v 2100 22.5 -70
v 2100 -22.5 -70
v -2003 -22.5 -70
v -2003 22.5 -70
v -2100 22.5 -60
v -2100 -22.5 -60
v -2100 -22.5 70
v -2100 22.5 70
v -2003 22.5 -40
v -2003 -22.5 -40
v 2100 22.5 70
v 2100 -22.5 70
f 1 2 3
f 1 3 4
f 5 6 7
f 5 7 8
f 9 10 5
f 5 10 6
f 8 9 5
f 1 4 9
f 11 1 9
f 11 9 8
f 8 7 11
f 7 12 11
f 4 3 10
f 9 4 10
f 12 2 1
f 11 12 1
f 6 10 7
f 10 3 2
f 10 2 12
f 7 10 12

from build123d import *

# Parameters (mm, degrees)
F0_W     = 45
F0_H     = 140
F1_DEPTH = 2100
F3_DEPTH = 45


with BuildPart() as f1:
    # F0 (on Right) → F1 (new body, symmetric)
    with BuildSketch(Plane.YZ):
        Rectangle(F0_W, F0_H)
    extrude(amount=F1_DEPTH, both=True)

    # F2 (on face) → F3 (cut, through all)
    with BuildSketch(Plane.XZ.offset(22.5)):
        Polygon((-2003, -40), (-2100, -60), (-2100, -70), (-2003, -70), align=None)
    extrude(amount=-F3_DEPTH, mode=Mode.SUBTRACT)


solid = f1.part
